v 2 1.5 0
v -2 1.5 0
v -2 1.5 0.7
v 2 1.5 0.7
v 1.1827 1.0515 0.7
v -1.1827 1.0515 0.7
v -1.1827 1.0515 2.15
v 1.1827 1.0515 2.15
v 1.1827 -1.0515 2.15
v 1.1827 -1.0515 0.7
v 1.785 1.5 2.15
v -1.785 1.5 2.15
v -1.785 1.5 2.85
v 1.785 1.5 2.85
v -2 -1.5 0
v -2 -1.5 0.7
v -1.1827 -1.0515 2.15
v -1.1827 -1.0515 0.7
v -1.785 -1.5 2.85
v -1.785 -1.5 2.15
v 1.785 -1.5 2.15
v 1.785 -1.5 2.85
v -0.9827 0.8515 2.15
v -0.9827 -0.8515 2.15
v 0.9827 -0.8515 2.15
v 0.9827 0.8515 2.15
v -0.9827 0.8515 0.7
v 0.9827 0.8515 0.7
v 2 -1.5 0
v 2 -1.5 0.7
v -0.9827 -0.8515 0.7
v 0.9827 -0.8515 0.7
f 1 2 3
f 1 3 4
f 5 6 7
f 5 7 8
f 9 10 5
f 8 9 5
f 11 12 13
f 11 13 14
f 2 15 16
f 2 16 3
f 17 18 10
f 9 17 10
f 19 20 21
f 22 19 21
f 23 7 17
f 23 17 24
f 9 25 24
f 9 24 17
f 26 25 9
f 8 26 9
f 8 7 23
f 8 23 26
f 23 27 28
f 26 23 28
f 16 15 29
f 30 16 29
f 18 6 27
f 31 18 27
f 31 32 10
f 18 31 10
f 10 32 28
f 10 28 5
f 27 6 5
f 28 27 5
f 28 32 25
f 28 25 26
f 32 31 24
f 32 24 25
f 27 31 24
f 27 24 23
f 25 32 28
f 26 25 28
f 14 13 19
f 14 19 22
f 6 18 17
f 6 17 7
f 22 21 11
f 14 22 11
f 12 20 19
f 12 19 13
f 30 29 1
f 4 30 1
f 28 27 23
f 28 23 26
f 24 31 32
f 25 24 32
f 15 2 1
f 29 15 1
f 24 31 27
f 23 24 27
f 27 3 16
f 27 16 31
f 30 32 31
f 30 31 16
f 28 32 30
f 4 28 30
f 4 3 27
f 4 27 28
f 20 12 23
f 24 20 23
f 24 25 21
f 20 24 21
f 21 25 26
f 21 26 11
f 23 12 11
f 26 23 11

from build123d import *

# Parameters (mm, degrees)
SKETCH_1_W      = 4
SKETCH_1_H      = 3
EXTRUDE_1_DEPTH = 0.7
SKETCH_2_W      = 1.965469396
SKETCH_2_H      = 1.702913888
EXTRUDE_2_DEPTH = 1.45
SKETCH_4_W      = 3.57
SKETCH_4_H      = 3
EXTRUDE_3_DEPTH = 0.7
EXTRUDE_4_REACH = 4.15
SKETCH_7_W      = 2.365469396
SKETCH_7_H      = 2.102913888


with BuildPart() as part:
    # Эскиз1 → Бобышка-Вытянуть1 (new body)
    with BuildSketch(Plane.XY):
        Rectangle(SKETCH_1_W, SKETCH_1_H)
    extrude(amount=EXTRUDE_1_DEPTH)

    # Эскиз2 → Бобышка-Вытянуть2 (add)
    with BuildSketch(Plane.XY.offset(0.7)):
        Rectangle(SKETCH_2_W, SKETCH_2_H)
    extrude(amount=EXTRUDE_2_DEPTH)

    # Эскиз4 → Бобышка-Вытянуть3 (add)
    with BuildSketch(Plane.XY.offset(2.15)):
        Rectangle(SKETCH_4_W, SKETCH_4_H)
    extrude(amount=EXTRUDE_3_DEPTH)


with BuildPart() as body_2:

    # Эскиз7 → Бобышка-Вытянуть4 (new body, up to next)
    with BuildSketch(Plane.XY.offset(0.7), mode=Mode.PRIVATE) as extrude_4_sk1:
        Rectangle(SKETCH_7_W, SKETCH_7_H)
    extrude_4_tool1 = extrude(extrude_4_sk1.sketch, amount=EXTRUDE_4_REACH, mode=Mode.PRIVATE) - part.part
    add(extrude_4_tool1.solids().sort_by_distance((0, 0, 0.7))[0])


solid = Compound([part.part, body_2.part])
